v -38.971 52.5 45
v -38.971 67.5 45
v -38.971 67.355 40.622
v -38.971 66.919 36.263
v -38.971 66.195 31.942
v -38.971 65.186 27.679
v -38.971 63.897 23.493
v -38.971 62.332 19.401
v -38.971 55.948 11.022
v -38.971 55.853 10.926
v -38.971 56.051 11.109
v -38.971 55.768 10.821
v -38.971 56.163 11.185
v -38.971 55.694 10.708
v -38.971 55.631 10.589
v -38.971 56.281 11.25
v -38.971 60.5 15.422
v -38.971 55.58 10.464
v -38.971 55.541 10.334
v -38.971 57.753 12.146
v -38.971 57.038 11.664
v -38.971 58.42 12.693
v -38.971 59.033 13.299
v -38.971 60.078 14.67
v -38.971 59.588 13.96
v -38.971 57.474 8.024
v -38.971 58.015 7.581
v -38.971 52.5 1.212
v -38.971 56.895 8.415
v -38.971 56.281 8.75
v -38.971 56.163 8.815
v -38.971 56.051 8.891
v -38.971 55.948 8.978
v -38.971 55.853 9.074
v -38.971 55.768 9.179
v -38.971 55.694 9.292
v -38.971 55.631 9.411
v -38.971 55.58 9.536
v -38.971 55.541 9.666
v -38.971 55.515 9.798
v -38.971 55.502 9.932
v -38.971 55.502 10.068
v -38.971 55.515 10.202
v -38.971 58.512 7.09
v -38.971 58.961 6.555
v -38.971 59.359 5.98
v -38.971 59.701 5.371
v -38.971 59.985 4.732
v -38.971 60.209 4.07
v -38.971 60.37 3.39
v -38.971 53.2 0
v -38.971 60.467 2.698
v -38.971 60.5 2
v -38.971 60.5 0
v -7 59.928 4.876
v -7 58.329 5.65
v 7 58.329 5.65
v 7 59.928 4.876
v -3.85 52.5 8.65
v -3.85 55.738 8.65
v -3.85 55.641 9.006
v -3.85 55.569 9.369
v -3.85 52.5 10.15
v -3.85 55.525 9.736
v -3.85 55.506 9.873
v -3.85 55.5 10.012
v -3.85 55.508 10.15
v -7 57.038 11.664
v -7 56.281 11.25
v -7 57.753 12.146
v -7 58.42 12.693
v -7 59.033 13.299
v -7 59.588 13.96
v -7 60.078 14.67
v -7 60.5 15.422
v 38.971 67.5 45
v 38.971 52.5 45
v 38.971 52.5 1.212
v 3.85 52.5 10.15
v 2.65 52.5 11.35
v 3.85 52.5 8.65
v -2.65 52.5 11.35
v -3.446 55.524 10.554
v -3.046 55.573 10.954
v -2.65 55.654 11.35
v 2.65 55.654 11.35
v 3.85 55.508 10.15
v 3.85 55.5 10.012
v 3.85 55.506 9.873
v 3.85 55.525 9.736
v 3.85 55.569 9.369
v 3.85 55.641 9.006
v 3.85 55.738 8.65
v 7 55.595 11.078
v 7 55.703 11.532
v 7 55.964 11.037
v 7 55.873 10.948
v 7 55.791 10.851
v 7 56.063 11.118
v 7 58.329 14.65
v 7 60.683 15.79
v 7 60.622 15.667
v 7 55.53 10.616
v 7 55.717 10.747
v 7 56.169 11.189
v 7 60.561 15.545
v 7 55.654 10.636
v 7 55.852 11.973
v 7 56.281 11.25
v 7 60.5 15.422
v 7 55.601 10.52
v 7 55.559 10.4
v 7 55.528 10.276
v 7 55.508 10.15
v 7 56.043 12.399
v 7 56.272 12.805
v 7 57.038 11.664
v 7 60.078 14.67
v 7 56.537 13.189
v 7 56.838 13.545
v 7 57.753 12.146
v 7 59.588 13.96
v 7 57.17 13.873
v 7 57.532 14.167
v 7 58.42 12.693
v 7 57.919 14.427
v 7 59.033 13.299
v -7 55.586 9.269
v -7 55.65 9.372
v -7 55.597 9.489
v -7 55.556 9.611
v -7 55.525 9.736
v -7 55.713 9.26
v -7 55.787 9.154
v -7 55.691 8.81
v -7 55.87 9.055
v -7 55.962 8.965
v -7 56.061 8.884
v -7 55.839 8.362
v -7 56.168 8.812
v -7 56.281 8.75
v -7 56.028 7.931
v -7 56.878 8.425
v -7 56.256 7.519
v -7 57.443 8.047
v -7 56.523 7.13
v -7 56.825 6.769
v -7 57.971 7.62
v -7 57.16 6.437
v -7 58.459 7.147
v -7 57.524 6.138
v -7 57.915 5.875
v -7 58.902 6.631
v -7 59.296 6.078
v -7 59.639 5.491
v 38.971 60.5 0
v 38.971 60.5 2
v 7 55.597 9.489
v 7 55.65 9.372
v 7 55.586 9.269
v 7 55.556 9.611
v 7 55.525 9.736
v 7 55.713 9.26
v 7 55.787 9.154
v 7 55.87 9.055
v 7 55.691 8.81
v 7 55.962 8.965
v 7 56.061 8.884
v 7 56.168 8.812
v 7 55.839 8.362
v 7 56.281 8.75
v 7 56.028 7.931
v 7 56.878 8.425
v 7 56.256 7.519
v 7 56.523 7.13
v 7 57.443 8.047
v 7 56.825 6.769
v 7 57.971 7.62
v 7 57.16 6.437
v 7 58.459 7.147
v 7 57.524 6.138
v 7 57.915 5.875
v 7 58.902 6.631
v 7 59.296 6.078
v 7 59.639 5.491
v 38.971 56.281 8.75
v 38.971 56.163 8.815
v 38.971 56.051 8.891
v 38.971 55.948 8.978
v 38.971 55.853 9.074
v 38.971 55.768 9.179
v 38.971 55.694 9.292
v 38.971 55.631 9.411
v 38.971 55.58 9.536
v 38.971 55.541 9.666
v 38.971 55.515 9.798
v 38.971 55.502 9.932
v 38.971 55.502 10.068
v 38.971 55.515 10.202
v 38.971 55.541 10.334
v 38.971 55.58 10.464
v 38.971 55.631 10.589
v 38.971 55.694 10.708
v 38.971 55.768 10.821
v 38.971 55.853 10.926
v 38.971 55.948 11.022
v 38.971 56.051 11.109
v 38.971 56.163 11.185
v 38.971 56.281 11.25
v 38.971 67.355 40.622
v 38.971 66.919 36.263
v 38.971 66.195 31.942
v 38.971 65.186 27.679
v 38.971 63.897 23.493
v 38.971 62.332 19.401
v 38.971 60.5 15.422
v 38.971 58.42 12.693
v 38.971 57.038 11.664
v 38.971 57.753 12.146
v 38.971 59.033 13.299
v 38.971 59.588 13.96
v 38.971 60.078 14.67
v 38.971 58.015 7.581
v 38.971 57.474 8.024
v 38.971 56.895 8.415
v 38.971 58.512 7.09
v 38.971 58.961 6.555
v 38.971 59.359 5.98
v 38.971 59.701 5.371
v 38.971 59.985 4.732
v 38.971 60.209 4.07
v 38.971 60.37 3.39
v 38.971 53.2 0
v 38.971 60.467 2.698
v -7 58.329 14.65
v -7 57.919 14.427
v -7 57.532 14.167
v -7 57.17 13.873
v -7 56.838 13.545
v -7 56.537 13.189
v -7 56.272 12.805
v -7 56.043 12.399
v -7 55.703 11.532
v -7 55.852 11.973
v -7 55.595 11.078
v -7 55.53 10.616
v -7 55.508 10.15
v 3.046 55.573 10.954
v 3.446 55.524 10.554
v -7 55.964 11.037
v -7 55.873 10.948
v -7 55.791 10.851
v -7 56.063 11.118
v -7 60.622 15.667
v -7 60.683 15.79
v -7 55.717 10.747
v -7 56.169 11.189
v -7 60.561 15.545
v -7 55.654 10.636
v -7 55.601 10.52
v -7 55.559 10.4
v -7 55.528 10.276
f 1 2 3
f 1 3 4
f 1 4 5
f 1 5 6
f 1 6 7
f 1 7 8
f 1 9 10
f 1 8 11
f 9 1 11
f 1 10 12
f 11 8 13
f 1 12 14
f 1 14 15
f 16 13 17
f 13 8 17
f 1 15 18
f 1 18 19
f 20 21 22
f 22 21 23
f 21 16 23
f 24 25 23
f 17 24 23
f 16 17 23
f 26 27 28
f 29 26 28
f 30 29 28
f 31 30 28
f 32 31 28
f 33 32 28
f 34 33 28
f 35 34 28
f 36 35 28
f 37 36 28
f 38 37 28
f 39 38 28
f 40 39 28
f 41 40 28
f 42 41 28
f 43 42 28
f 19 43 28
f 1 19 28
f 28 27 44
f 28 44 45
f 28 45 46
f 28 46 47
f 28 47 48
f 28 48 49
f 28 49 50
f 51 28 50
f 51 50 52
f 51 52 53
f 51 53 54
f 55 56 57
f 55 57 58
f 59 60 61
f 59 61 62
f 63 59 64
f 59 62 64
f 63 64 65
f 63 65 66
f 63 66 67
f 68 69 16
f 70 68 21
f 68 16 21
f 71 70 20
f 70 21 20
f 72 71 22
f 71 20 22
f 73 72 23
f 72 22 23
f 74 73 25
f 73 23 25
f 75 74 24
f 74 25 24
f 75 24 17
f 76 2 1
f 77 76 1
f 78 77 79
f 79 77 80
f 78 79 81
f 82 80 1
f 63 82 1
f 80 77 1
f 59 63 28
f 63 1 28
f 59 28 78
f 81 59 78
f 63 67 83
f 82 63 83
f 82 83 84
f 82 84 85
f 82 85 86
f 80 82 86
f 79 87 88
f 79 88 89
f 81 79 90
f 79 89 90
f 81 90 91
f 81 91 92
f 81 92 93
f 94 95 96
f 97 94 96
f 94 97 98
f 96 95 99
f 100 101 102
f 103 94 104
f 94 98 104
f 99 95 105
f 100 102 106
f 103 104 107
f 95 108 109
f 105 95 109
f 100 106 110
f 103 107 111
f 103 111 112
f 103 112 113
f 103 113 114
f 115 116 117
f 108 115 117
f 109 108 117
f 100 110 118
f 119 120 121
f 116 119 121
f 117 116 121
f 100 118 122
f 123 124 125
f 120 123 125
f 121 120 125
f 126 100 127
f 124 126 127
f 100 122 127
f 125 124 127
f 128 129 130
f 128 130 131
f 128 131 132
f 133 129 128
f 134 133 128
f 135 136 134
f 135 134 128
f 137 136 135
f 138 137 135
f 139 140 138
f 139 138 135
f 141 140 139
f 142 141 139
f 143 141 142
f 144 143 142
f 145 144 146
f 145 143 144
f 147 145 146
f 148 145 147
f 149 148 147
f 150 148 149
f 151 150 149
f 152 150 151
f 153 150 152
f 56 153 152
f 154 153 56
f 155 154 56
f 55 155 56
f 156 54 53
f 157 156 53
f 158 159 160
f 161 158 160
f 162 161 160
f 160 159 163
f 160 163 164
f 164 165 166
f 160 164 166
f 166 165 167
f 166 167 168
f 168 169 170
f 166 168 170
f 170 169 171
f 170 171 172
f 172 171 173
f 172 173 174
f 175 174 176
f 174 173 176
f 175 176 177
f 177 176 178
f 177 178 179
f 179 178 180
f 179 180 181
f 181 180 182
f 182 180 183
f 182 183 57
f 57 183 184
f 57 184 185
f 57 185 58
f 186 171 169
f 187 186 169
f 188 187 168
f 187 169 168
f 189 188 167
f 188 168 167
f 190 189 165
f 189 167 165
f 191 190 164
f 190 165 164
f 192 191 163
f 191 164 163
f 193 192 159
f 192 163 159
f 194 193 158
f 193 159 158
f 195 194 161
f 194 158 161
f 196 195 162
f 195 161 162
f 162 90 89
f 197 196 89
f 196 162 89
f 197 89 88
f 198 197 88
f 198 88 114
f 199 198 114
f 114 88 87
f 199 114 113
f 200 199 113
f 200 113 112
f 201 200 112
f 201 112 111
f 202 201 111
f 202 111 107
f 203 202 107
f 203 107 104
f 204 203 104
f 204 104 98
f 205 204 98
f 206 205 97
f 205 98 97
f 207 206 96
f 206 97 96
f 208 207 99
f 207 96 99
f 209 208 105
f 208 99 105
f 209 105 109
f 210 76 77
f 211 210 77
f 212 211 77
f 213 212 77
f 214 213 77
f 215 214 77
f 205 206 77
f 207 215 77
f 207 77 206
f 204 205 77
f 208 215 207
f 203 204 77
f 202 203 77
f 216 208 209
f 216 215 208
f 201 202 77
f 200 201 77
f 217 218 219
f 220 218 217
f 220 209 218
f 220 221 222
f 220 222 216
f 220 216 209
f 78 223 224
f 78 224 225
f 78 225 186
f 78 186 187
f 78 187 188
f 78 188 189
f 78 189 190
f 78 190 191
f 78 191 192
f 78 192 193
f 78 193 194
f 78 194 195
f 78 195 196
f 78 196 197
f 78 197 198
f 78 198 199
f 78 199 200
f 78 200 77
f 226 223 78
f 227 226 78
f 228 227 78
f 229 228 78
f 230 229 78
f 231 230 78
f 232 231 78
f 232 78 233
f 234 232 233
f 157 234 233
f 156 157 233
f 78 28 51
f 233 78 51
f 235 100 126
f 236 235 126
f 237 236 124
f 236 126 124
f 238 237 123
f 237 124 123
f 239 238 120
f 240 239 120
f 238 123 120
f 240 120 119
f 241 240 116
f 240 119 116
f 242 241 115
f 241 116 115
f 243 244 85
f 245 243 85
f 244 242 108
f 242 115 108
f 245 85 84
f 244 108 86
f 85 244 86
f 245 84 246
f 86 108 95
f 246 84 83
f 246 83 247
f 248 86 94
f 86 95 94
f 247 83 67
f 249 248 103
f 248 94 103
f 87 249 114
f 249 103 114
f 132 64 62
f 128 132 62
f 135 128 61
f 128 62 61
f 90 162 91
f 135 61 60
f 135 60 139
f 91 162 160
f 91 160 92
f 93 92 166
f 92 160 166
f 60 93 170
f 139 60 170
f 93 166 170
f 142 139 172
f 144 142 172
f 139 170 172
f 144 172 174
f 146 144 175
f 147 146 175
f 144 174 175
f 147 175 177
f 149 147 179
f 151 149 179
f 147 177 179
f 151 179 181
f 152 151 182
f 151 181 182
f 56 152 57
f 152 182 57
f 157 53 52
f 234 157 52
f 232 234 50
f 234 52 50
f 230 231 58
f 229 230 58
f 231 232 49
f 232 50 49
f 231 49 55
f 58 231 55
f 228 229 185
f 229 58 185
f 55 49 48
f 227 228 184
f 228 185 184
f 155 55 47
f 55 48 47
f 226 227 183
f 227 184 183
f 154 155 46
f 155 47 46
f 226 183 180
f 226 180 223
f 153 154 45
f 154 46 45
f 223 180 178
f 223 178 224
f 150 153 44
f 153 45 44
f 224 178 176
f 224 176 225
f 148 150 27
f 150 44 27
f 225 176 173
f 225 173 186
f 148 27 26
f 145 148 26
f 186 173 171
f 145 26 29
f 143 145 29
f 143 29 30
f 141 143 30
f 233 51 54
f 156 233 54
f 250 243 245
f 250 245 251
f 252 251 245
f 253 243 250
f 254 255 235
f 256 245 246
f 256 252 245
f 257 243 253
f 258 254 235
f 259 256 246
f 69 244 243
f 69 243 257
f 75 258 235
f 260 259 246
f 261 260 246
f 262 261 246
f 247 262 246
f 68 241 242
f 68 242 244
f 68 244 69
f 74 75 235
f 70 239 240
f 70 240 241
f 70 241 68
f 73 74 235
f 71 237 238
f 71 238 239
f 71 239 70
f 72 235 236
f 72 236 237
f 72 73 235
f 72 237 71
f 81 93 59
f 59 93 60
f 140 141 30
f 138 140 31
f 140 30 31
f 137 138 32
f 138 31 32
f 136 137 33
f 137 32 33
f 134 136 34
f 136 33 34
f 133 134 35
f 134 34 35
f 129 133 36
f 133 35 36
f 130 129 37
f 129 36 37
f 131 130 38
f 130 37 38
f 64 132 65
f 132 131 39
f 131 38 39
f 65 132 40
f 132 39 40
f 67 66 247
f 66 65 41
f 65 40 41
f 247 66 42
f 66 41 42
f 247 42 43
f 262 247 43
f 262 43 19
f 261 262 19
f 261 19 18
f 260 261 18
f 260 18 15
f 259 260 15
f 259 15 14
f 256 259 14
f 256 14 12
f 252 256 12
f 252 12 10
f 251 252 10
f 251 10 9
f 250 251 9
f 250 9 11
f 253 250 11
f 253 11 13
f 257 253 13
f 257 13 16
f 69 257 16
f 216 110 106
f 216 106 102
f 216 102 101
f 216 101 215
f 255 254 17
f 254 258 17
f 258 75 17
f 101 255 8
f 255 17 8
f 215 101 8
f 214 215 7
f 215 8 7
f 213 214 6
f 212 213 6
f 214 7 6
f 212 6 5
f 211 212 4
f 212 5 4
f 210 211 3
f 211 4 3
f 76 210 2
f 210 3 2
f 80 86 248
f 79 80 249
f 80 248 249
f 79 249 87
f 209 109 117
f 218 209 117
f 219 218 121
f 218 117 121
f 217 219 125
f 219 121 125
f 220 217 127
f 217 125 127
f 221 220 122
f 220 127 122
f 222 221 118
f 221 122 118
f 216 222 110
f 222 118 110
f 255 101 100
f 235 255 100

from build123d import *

# Parameters (mm, degrees)
EXTRUDE_1509_DEPTH      = 38.971143
EXTRUDE_1509_DEPTH_BACK = 38.971143
USB_REACH               = 62.065
CUT_EXTRUDE_2243_DEPTH  = 7


with BuildPart() as part:
    # Эскиз1 → Extrude 1509 (new, two sides: drawn at the far end of the back side and taken through both)
    with BuildSketch(Plane(origin=(0, 0, 0), x_dir=(0, 0, -1), z_dir=(1, 0, 0)).offset(-EXTRUDE_1509_DEPTH_BACK)):
        with BuildLine():
            Line((0, 60.5), (-2, 60.5))
            ThreePointArc((-2, 60.5), (-5.97996079, 59.358562264), (-8.75, 56.28125))
            ThreePointArc((-8.75, 56.28125), (-10, 55.5), (-11.25, 56.28125))
            ThreePointArc((-11.25, 56.28125), (-12.988798615, 58.733904838), (-15.421871621, 60.5))
            ThreePointArc((-15.421871621, 60.5), (-29.802420601, 65.726159332), (-45, 67.5))
            Line((-45, 67.5), (-45, 52.5))
            Line((-45, 52.5), (-1.212435565, 52.5))
            Line((-1.212435565, 52.5), (0, 53.2))
            Line((0, 53.2), (0, 60.5))
        make_face()
    extrude(amount=EXTRUDE_1509_DEPTH + EXTRUDE_1509_DEPTH_BACK)

    # Эскиз3 → Вырез под USB (cut, up to next)
    with BuildSketch(Plane(origin=(0, 60.5, 0), x_dir=(1, 0, 0), z_dir=(0, 1, 0)), mode=Mode.PRIVATE) as usb_sk1:
        Polygon((3.85, -8.65), (-3.85, -8.65), (-3.85, -10.15), (-2.65, -11.35), (2.65, -11.35), (3.85, -10.15), align=None)
    usb_tool1 = extrude(usb_sk1.sketch, amount=-USB_REACH, mode=Mode.PRIVATE) & part.part
    add(usb_tool1.solids().sort_by_distance((0, 60.5, 9.929302))[0], mode=Mode.SUBTRACT)

    # Эскиз4 → Cut-Extrude 2243 (cut, symmetric)
    with BuildSketch(Plane(origin=(0, 0, 0), x_dir=(0, 0, -1), z_dir=(1, 0, 0))):
        with BuildLine():
            Line((-5.65, 58.328664085), (-1.315214811, 67.278875413))
            Line((-1.315214811, 67.278875413), (-18.984785189, 67.278875413))
            Line((-18.984785189, 67.278875413), (-14.65, 58.328664085))
            ThreePointArc((-14.65, 58.328664085), (-10.15, 55.508113557), (-5.65, 58.328664085))
        make_face()
    extrude(amount=CUT_EXTRUDE_2243_DEPTH, both=True, mode=Mode.SUBTRACT)


solid = part.part
